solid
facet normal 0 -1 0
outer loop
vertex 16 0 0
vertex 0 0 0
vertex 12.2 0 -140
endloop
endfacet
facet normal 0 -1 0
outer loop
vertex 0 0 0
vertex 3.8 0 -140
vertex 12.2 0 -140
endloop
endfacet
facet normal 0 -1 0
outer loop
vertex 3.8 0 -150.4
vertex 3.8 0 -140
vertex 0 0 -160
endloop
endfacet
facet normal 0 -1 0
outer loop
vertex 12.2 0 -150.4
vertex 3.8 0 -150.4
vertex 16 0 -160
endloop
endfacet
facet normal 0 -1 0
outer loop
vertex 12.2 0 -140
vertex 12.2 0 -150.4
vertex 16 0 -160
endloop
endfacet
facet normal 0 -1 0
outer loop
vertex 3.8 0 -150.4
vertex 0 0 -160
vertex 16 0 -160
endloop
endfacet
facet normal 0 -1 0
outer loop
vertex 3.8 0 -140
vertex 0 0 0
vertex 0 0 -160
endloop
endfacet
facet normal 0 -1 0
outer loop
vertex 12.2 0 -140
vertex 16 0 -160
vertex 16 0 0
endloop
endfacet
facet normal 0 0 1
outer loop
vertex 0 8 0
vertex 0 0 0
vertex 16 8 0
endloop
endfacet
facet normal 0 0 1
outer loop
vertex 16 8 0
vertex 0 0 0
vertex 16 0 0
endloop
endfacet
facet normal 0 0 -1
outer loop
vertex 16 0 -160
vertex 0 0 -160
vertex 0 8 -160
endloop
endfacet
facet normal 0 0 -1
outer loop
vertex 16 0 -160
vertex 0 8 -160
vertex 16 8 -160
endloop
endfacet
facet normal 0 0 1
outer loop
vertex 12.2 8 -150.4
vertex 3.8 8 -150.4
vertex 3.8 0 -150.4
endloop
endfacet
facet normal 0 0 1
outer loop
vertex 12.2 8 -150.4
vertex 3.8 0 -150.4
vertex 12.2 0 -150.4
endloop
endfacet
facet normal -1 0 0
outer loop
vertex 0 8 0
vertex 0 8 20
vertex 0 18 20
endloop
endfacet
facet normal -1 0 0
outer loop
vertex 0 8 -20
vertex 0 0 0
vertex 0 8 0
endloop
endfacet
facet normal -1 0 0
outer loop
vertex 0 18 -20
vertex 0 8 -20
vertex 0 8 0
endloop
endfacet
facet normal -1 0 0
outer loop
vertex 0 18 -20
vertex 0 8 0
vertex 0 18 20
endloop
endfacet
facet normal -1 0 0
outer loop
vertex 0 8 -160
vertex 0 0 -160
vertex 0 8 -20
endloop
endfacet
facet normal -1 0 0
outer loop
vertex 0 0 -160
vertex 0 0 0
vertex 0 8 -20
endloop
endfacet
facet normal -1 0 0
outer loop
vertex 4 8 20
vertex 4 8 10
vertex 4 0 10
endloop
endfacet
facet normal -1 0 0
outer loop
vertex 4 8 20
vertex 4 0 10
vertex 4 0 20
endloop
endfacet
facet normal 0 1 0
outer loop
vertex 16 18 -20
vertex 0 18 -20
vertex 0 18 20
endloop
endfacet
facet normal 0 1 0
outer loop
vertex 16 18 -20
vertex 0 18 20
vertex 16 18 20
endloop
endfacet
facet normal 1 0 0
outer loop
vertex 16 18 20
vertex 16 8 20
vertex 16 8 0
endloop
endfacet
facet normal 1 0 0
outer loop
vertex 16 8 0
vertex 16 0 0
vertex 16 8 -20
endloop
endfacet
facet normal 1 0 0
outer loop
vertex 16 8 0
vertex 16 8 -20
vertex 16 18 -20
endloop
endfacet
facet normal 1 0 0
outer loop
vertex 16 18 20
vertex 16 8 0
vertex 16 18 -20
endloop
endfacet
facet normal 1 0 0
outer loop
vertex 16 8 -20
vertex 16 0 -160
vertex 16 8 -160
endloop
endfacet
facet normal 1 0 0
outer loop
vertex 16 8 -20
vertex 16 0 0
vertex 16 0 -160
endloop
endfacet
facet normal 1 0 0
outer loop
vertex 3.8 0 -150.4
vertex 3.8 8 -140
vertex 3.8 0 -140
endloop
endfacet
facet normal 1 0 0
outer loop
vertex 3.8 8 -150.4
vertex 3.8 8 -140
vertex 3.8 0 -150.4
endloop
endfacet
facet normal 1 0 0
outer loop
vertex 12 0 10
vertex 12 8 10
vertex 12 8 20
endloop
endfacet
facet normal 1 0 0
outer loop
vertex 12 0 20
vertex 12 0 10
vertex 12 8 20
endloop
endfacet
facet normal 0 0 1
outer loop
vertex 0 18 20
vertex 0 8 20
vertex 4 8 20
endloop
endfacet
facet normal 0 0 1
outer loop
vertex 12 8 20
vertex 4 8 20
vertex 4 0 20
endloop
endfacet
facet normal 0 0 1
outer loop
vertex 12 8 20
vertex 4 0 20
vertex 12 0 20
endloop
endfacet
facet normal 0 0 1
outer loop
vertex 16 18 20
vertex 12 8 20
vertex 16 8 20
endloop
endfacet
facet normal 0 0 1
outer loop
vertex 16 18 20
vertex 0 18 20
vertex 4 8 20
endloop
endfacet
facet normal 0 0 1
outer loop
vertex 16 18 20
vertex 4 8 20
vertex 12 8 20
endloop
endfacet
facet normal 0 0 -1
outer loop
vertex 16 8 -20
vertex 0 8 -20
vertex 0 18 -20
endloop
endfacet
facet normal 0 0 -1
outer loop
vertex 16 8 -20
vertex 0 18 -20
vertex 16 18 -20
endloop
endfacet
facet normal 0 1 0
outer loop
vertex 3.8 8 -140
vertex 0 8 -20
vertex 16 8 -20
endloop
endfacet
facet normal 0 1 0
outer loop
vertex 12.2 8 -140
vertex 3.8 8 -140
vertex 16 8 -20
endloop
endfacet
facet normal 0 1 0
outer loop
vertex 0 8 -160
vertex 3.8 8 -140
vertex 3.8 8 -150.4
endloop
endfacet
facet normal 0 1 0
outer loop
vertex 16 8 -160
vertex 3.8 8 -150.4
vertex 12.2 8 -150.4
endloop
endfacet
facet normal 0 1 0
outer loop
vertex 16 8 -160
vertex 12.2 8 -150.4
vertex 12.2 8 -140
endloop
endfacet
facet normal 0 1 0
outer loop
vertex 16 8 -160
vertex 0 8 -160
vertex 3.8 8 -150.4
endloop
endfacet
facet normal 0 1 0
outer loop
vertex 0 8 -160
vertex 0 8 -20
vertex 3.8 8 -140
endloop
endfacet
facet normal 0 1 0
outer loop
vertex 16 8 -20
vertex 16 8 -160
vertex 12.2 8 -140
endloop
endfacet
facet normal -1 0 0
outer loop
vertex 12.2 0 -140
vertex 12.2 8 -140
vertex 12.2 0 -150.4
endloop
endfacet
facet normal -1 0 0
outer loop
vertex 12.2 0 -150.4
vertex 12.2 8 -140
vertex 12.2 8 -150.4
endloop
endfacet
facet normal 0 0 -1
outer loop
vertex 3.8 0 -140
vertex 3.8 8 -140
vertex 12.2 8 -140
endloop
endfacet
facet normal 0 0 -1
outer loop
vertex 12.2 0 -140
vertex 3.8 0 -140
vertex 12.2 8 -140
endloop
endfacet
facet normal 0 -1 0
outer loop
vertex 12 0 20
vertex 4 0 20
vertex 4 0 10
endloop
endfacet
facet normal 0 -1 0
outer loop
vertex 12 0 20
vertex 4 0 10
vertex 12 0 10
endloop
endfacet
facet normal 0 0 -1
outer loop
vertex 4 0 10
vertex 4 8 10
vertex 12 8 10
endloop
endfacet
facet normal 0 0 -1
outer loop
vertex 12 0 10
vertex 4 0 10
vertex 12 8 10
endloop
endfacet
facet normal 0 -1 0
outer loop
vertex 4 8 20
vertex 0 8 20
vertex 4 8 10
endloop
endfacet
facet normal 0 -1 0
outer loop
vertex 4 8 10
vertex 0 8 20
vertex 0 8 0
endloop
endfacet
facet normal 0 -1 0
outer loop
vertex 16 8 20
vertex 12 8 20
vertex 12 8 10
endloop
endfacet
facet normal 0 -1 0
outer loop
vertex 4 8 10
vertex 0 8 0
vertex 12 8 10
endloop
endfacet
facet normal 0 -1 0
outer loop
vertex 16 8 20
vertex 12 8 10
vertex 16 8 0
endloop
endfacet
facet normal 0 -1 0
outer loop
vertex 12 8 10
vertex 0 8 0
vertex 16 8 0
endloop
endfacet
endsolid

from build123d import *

# Parameters (mm, degrees)
SKETCH_1_W          = 16
SKETCH_1_H          = 160
EXTRUDE_1_DEPTH     = 8
SKETCH_2_W          = 16
SKETCH_2_H          = 20
EXTRUDE_2_DEPTH     = 10
SKETCH_3_W          = 16
SKETCH_3_H          = 10
EXTRUDE_3_DEPTH     = 20
SKETCH_4_W          = 8
SKETCH_4_H          = 10
EXTRUDE_4_DEPTH     = 8
SKETCH_5_W          = 8.4
SKETCH_5_H          = 10.4
CUT_EXTRUDE_1_DEPTH = 162.108658985


with BuildPart() as part:
    # 草图1 → 凸台-拉伸1 (new body)
    with BuildSketch(Plane(origin=(0, 0, 0), x_dir=(1, 0, 0), z_dir=(0, 1, 0))):
        with Locations((8, 80)):
            Rectangle(SKETCH_1_W, SKETCH_1_H)
    extrude(amount=EXTRUDE_1_DEPTH)

    # 草图2 → 凸台-拉伸2 (add)
    with BuildSketch(Plane(origin=(0, 8, 0), x_dir=(1, 0, 0), z_dir=(0, 1, 0))):
        with Locations((8, 10)):
            Rectangle(SKETCH_2_W, SKETCH_2_H)
    extrude(amount=EXTRUDE_2_DEPTH)

    # 草图3 → 凸台-拉伸3 (add)
    with BuildSketch(Plane.XY):
        with Locations((8, 13)):
            Rectangle(SKETCH_3_W, SKETCH_3_H)
    extrude(amount=EXTRUDE_3_DEPTH)

    # 草图4 → 凸台-拉伸4 (add)
    with BuildSketch(Plane.XZ.offset(-8)):
        with Locations((8, 15)):
            Rectangle(SKETCH_4_W, SKETCH_4_H)
    extrude(amount=EXTRUDE_4_DEPTH)

    # 草图5 → 切除-拉伸1 (cut, through all)
    with BuildSketch(Plane(origin=(0, 8, 0), x_dir=(1, 0, 0), z_dir=(0, 1, 0))):
        with Locations((8, 145.2)):
            Rectangle(SKETCH_5_W, SKETCH_5_H)
    extrude(amount=-CUT_EXTRUDE_1_DEPTH, mode=Mode.SUBTRACT)


solid = part.part
